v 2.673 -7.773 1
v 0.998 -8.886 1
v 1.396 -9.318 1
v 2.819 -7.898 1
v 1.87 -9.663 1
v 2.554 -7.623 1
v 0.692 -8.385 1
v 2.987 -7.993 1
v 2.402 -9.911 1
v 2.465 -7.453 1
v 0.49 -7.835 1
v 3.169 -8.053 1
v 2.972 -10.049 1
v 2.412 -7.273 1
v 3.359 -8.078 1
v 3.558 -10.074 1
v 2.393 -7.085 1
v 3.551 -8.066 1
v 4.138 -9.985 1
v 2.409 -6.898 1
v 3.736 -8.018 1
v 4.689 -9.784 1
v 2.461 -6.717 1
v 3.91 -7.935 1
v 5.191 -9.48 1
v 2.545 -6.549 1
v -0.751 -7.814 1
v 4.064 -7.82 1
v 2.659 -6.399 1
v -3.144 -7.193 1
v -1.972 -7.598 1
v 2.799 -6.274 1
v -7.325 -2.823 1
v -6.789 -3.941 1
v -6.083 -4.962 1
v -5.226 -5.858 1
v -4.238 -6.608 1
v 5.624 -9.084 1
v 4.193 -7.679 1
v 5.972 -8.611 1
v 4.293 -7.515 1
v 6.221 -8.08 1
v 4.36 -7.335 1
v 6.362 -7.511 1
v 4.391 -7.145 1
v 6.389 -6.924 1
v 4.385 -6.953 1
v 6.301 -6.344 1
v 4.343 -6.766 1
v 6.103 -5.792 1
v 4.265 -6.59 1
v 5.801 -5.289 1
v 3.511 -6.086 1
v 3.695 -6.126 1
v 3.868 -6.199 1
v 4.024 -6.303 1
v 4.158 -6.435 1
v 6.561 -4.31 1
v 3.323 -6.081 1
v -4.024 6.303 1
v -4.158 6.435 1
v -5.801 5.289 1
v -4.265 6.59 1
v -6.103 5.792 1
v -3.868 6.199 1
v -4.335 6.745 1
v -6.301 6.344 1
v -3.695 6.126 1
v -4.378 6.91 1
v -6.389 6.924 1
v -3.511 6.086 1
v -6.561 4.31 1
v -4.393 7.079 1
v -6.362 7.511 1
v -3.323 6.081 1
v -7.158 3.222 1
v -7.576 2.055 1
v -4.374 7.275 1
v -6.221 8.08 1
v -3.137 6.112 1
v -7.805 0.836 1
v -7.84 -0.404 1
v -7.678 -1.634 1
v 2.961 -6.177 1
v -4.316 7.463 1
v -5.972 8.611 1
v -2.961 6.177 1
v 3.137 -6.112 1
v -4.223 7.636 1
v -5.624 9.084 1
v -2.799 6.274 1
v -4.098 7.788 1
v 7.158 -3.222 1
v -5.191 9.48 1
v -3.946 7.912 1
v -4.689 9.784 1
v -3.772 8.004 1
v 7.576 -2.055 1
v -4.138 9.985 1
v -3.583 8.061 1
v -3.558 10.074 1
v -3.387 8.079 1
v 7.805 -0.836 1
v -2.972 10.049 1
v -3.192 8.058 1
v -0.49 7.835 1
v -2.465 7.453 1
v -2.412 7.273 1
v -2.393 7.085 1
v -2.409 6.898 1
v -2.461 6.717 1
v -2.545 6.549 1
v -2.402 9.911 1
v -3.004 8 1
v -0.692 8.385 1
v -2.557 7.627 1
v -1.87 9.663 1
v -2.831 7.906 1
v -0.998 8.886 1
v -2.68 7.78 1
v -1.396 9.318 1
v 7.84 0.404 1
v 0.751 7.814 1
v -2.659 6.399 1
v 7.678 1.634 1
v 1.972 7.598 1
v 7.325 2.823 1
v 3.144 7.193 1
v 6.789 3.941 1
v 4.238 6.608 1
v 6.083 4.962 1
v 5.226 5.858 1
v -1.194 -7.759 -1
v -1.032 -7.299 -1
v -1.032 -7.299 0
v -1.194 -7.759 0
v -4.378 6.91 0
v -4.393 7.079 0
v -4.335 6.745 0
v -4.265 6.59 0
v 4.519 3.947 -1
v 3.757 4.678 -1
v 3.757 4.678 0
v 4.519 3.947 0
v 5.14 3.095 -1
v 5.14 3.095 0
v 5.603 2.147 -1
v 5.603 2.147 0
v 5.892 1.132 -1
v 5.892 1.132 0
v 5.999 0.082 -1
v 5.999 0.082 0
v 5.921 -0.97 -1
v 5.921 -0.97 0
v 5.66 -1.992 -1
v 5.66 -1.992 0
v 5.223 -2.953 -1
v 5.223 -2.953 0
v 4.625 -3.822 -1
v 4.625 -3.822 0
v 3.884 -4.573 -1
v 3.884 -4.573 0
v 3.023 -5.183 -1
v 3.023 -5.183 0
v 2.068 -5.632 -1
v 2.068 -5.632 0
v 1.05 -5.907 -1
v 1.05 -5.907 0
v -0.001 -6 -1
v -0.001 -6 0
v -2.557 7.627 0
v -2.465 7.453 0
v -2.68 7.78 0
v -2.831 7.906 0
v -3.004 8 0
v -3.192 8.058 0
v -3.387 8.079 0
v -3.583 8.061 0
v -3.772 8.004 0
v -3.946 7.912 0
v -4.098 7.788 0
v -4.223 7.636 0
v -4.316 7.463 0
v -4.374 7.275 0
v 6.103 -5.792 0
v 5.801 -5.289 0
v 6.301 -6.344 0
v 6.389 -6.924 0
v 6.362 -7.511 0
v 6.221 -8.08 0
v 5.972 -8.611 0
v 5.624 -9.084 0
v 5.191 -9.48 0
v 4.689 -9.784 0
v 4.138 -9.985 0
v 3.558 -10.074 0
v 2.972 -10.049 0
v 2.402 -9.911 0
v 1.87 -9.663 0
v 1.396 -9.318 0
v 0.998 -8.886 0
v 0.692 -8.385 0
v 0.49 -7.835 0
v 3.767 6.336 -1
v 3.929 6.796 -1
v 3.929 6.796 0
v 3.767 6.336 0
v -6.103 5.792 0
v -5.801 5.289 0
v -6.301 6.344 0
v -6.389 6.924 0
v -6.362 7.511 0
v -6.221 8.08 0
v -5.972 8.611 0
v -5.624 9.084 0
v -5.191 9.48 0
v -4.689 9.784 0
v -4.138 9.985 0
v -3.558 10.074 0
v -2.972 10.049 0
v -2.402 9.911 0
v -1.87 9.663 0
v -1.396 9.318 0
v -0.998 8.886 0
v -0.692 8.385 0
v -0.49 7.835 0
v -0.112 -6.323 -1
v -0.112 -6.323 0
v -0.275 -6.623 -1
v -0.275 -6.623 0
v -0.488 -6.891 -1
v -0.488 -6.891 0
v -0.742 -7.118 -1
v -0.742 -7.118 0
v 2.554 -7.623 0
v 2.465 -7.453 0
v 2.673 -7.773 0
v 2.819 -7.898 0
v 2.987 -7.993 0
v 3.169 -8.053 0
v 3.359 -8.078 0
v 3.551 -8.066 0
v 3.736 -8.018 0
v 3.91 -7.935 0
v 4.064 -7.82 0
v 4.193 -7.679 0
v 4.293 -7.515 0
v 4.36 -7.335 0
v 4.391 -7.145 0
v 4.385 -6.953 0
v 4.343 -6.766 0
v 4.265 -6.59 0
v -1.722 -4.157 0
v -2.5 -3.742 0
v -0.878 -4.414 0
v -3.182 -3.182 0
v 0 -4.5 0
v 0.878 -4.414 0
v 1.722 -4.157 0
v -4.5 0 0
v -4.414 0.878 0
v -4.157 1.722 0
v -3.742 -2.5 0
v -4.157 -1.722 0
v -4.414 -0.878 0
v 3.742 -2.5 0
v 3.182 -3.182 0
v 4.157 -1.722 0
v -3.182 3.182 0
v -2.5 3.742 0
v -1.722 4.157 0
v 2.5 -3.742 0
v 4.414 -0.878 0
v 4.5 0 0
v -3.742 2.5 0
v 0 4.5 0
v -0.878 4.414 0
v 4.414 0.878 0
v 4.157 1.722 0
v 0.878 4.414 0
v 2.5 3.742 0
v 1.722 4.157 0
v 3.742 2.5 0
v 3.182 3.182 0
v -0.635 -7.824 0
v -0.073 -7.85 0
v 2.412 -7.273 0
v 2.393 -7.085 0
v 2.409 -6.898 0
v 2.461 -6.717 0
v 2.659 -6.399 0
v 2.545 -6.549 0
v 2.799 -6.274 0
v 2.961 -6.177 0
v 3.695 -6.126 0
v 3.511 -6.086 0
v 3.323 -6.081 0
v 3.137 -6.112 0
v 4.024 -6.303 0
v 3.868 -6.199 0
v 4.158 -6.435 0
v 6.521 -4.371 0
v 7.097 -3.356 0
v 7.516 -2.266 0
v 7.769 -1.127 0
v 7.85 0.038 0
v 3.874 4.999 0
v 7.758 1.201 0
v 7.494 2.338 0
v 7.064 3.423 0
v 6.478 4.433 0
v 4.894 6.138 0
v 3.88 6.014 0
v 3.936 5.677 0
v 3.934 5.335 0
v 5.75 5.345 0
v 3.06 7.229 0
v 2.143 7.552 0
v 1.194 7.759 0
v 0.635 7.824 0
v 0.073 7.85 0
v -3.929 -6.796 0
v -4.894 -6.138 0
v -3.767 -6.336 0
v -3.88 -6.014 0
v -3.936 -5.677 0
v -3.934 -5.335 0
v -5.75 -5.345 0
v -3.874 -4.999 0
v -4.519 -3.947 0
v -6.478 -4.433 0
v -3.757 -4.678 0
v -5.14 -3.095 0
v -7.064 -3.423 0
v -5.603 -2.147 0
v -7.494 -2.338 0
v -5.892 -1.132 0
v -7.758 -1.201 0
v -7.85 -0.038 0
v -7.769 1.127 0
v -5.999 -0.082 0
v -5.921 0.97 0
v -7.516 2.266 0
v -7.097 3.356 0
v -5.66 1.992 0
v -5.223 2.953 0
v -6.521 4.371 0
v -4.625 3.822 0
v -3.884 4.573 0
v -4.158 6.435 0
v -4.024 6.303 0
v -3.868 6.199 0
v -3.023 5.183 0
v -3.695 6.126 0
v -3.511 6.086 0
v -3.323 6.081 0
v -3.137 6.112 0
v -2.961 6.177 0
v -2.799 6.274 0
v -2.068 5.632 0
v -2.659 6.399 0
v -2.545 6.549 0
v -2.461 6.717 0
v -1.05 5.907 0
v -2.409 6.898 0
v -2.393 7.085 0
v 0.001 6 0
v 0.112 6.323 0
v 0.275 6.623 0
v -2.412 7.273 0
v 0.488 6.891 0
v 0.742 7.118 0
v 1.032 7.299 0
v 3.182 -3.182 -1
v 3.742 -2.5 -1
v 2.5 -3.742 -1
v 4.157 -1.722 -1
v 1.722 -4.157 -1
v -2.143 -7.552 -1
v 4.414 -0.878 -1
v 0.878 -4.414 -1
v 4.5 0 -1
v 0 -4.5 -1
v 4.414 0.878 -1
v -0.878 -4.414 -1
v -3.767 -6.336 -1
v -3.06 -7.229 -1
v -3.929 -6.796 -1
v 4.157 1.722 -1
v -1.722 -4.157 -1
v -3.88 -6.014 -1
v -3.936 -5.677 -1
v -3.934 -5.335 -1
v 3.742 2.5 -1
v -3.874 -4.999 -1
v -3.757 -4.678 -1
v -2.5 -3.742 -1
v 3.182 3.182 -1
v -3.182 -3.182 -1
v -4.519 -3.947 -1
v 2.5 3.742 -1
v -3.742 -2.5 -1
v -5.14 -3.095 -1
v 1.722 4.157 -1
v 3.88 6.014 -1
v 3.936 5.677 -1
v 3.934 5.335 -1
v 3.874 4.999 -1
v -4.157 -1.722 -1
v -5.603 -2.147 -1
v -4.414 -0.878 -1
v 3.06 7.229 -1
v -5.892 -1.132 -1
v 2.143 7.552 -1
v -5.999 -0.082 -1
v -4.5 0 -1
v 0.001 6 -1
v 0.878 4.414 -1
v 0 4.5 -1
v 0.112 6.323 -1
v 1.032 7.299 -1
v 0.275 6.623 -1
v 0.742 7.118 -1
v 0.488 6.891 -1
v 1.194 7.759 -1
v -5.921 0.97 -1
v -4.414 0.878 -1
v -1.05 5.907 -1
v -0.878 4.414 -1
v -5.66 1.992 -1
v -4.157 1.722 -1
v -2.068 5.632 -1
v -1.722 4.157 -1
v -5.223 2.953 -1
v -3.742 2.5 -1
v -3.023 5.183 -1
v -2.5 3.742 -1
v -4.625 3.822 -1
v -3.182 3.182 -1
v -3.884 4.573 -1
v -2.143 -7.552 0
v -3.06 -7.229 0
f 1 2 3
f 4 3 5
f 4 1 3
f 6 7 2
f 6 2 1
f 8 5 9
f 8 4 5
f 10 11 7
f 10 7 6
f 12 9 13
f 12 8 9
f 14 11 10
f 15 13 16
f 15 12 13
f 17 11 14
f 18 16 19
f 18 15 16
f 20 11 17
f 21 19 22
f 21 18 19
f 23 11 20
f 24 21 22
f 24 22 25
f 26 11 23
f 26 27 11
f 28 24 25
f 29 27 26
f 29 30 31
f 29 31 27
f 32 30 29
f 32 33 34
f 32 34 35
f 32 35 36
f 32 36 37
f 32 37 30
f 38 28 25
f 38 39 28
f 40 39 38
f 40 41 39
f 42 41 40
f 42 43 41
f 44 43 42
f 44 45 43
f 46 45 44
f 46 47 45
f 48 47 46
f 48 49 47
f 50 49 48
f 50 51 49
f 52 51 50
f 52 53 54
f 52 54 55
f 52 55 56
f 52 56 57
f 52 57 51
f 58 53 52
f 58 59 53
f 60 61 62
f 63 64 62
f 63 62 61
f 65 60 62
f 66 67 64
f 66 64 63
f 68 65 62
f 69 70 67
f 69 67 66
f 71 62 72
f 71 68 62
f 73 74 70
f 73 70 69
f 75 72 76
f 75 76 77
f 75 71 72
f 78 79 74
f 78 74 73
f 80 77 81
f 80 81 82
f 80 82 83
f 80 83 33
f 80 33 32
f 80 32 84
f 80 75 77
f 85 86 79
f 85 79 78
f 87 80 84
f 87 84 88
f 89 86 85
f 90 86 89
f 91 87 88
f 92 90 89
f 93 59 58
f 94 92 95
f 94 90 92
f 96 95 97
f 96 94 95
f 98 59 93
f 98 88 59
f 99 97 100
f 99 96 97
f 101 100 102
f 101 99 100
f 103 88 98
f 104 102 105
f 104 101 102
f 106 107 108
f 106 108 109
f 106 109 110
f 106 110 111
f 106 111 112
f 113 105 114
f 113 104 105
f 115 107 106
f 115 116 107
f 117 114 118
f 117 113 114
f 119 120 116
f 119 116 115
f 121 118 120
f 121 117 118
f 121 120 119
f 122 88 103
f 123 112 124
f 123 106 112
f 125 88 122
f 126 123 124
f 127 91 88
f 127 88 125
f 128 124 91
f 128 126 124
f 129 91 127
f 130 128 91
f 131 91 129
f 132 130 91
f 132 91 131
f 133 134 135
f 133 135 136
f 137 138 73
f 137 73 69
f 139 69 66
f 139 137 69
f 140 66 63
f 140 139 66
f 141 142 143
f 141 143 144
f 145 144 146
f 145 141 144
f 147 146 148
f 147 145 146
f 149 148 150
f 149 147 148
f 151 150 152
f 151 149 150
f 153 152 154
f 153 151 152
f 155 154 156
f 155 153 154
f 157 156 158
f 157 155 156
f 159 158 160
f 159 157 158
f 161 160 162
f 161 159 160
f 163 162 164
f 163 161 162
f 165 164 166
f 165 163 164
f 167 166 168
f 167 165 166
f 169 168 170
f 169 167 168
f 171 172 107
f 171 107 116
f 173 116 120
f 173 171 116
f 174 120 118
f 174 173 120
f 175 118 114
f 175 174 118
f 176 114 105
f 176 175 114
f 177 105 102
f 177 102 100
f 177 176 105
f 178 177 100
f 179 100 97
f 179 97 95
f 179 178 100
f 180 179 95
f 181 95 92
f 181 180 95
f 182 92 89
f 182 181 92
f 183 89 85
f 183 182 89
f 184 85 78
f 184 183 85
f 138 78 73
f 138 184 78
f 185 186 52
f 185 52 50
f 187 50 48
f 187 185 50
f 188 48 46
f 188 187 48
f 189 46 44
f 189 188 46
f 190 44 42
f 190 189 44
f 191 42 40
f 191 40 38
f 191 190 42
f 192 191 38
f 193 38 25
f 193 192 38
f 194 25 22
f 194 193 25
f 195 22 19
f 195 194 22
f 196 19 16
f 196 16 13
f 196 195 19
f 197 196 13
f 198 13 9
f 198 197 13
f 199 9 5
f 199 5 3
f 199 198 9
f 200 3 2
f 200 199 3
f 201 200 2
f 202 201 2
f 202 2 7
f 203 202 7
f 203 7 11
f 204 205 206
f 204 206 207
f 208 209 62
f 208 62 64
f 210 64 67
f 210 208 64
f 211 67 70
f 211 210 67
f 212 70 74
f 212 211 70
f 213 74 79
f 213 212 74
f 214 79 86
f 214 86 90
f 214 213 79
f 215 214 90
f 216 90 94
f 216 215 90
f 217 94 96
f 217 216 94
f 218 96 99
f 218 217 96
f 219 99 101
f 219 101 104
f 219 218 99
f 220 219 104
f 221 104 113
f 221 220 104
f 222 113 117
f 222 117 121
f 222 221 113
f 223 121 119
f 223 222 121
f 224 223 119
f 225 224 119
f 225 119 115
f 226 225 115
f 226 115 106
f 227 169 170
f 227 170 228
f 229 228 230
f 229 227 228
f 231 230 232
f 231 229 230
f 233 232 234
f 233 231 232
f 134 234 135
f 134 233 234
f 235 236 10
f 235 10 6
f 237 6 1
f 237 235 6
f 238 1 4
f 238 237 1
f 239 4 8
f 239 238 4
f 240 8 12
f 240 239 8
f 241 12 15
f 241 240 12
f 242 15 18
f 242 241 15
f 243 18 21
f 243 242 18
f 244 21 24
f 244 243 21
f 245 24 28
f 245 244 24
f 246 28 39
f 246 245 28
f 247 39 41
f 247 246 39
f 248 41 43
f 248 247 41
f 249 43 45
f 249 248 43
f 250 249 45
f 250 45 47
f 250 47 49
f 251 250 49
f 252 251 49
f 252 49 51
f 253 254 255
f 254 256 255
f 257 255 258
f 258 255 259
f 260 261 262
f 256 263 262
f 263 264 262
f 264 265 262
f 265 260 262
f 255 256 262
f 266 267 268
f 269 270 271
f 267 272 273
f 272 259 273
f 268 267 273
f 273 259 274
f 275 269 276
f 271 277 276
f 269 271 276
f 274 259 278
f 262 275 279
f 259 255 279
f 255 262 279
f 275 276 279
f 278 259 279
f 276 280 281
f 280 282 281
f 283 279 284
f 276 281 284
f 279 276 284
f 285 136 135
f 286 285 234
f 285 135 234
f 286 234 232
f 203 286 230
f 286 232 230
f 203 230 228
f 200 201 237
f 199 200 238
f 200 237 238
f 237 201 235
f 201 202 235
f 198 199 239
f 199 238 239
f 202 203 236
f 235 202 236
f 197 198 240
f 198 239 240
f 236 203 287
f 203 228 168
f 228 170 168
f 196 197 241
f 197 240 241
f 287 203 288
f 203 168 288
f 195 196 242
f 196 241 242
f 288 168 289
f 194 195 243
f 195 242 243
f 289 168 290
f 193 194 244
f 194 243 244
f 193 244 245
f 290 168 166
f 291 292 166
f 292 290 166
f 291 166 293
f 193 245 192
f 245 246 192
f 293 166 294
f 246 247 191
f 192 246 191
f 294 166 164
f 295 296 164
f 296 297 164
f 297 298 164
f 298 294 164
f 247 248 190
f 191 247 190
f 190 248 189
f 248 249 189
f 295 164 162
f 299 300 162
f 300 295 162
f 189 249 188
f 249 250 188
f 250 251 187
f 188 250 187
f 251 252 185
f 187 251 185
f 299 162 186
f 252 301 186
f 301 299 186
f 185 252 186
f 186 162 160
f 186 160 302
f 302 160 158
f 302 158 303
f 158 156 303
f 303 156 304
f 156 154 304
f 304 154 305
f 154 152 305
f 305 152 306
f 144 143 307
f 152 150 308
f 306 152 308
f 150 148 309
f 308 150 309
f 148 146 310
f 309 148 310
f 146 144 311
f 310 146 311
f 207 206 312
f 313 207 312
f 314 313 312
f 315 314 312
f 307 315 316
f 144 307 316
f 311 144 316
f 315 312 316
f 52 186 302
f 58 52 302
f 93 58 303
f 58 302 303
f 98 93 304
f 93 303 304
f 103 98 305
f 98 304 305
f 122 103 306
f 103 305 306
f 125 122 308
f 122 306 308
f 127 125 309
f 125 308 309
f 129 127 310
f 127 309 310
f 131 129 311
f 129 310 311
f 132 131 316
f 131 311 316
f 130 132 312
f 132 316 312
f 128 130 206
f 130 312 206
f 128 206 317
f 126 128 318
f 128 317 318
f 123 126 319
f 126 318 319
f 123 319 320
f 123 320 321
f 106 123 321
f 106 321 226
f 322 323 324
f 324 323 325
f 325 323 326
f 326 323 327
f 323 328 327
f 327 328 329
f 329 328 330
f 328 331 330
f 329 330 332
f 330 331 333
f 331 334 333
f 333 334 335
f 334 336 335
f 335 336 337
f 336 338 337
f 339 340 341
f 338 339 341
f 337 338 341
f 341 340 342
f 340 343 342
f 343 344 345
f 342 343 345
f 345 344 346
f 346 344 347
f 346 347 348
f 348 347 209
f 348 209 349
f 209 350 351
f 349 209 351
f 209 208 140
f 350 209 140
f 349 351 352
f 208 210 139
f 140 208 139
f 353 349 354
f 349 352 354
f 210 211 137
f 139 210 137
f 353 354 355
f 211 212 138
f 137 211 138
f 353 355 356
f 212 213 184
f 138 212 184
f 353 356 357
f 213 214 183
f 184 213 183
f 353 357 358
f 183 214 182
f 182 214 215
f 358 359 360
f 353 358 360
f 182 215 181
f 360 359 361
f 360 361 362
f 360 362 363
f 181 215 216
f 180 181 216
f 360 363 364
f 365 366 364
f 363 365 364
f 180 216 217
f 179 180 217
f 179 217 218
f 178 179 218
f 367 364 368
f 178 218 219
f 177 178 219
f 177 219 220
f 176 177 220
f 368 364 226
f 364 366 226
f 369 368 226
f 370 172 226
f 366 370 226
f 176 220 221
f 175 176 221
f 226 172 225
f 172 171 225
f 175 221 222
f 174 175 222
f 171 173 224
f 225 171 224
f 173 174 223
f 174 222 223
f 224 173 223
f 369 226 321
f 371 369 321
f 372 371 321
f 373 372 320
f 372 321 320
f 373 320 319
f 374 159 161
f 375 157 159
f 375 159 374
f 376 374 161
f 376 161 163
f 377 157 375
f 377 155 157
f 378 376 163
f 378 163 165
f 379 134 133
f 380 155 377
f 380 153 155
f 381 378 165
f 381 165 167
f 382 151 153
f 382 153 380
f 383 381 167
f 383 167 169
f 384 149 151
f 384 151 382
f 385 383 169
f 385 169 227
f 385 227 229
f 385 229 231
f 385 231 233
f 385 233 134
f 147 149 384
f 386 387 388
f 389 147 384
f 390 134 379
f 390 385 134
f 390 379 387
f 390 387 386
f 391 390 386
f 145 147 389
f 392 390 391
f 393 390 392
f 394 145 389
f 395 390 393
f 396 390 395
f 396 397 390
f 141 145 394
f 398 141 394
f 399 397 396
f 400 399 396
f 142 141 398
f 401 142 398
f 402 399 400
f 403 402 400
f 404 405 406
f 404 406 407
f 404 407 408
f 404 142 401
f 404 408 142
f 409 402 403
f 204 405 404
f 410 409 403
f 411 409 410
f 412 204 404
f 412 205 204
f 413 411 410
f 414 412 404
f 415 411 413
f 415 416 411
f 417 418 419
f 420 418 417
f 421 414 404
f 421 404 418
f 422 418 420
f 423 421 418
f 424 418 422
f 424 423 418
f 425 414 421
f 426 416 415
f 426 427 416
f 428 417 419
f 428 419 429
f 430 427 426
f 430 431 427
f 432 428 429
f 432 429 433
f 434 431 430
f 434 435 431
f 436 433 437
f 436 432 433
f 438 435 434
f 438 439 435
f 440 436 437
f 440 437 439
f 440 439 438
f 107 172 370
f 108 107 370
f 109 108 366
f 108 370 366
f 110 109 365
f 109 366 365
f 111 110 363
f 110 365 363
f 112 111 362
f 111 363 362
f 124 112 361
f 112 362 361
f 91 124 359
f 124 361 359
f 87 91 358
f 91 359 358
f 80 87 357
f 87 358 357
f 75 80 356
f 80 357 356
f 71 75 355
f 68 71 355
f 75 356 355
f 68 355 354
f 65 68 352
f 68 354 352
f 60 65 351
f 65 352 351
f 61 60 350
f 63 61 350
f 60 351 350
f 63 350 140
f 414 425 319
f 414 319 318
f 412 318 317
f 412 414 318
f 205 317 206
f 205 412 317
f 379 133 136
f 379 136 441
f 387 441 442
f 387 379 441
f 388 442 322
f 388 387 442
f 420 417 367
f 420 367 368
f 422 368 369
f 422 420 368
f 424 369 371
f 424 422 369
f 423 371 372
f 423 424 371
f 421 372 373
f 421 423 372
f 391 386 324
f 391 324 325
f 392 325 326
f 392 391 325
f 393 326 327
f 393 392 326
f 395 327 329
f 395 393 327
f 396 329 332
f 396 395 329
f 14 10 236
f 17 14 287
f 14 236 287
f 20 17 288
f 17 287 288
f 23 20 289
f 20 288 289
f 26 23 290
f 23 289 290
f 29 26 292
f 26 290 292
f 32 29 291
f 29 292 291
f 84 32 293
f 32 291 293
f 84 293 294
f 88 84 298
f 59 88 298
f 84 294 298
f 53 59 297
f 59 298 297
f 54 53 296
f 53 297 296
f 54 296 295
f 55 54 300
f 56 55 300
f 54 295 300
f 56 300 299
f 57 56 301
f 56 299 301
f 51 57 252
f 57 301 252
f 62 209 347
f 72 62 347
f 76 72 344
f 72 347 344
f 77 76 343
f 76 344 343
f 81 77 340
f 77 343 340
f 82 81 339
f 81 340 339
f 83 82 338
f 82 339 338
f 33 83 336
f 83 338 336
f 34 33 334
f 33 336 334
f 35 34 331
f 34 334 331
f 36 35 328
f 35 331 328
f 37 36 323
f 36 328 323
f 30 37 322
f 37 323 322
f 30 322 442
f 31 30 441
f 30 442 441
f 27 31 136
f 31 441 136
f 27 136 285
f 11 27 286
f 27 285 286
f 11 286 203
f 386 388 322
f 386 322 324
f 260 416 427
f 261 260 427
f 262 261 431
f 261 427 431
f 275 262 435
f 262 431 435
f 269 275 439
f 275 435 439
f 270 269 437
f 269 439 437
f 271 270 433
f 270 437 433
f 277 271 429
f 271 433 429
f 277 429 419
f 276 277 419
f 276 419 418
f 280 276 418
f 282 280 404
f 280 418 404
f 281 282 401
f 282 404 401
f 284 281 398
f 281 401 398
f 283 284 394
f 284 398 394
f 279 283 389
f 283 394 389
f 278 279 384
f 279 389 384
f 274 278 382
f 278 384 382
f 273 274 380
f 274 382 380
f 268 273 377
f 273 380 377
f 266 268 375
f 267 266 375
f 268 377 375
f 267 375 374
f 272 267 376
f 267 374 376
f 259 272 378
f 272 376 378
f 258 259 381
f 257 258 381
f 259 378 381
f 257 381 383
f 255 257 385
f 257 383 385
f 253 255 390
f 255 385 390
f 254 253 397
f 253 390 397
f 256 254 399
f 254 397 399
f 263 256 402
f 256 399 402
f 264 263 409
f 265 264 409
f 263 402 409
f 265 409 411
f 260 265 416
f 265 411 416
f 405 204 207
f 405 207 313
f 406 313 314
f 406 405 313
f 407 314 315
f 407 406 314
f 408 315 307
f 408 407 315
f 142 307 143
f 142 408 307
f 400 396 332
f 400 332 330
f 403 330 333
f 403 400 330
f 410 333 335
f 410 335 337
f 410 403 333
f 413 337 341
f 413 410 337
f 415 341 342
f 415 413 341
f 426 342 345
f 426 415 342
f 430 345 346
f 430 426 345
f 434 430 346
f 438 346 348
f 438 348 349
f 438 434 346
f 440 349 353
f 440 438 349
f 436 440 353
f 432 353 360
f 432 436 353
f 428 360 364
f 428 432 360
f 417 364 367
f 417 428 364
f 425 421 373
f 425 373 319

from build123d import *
from build123d.topology import SkipClean

# Parameters (mm, degrees)
SKETCH1_R           = 7.85
BOSS_EXTRUDE1_DEPTH = 1
BOSS_EXTRUDE2_START = 1
SKETCH3_R           = 6
SKETCH3_R_2         = 4.5
BOSS_EXTRUDE2_DEPTH = 1
BOSS_EXTRUDE3_DEPTH = 1
SKETCH2_3_R         = 1
CUT_EXTRUDE1_DEPTH  = 2
SKETCH2_4_R         = 1
CUT_EXTRUDE2_DEPTH  = 3


with BuildPart() as part:
    # Sketch1 → Boss-Extrude1 (new body)
    with BuildSketch(Plane.XY):
        Circle(SKETCH1_R)
    extrude(amount=BOSS_EXTRUDE1_DEPTH)

    # Sketch3 → Boss-Extrude2 (add)
    # profile 1 of 3: a face of its own
    with SkipClean():  # the faces are left unmerged after this step: merging them gives an invalid solid
        with BuildSketch(Plane(origin=(0, 0, 0), x_dir=(-1, 0, 0), z_dir=(0, 0, -1)).offset(BOSS_EXTRUDE2_START)):
            Circle(SKETCH3_R)
            Circle(SKETCH3_R_2, mode=Mode.SUBTRACT)
        # profile 2 of 3: a face of its own
        with BuildSketch(Plane(origin=(0, 0, 0), x_dir=(-1, 0, 0), z_dir=(0, 0, -1)).offset(BOSS_EXTRUDE2_START)):
            with BuildLine():
                ThreePointArc((3.757317387, -4.677880508), (1.992185075, -5.659611173), (0.001300165, -5.999999859))
                ThreePointArc((0.001300165, -5.999999859), (0.375700996, -6.761308528), (1.032012818, -7.298915878))
                Line((1.032012818, -7.298915878), (1.193852248, -7.758686539))
                ThreePointArc((1.193852248, -7.758686539), (2.606442139, -7.404657951), (3.929330982, -6.795797086))
                Line((3.929330982, -6.795797086), (3.767491551, -6.336026426))
                ThreePointArc((3.767491551, -6.336026426), (3.9423428, -5.505849389), (3.757317387, -4.677880508))
            make_face()
        # profile 3 of 3: a face of its own
        with BuildSketch(Plane(origin=(0, 0, 0), x_dir=(-1, 0, 0), z_dir=(0, 0, -1)).offset(BOSS_EXTRUDE2_START)):
            with BuildLine():
                Line((-3.929330982, 6.795797086), (-3.767491551, 6.336026426))
                ThreePointArc((-3.767491551, 6.336026426), (-3.9423428, 5.505849389), (-3.757317387, 4.677880508))
                ThreePointArc((-3.757317387, 4.677880508), (-1.992185075, 5.659611173), (-0.001300165, 5.999999859))
                ThreePointArc((-0.001300165, 5.999999859), (-0.375700996, 6.761308528), (-1.032012818, 7.298915878))
                Line((-1.032012818, 7.298915878), (-1.193852248, 7.758686539))
                ThreePointArc((-1.193852248, 7.758686539), (-2.606442139, 7.404657951), (-3.929330982, 6.795797086))
            make_face()
        extrude(amount=-BOSS_EXTRUDE2_DEPTH)

    # Sketch2 → Boss-Extrude3 (add)
    with BuildSketch(Plane(origin=(0, 0, 0), x_dir=(-1, 0, 0), z_dir=(0, 0, -1))):
        with BuildLine():
            ThreePointArc((-4.265263368, -6.590146311), (-5.074768612, -5.989092046), (-5.800557161, -5.289237811))
            ThreePointArc((-5.800557161, -5.289237811), (-4.68948187, -9.784235269), (-0.489616971, -7.834716027))
            ThreePointArc((-0.489616971, -7.834716027), (-1.489786667, -7.707336485), (-2.46537987, -7.452811691))
            ThreePointArc((-2.46537987, -7.452811691), (-3.825061249, -7.980689597), (-4.265263368, -6.590146311))
        make_face()
        with BuildLine():
            ThreePointArc((2.46537987, 7.452811691), (3.583283252, 8.060617089), (4.392850938, 7.078916761))
            ThreePointArc((4.392850938, 7.078916761), (4.360428436, 6.826342445), (4.265263368, 6.590146311))
            ThreePointArc((4.265263368, 6.590146311), (5.074768612, 5.989092046), (5.800557161, 5.289237811))
            ThreePointArc((5.800557161, 5.289237811), (4.68948187, 9.784235269), (0.489616971, 7.834716027))
            ThreePointArc((0.489616971, 7.834716027), (1.489786667, 7.707336485), (2.46537987, 7.452811691))
        make_face()
    extrude(amount=-BOSS_EXTRUDE3_DEPTH)

    # Sketch2<3> → Cut-Extrude1 (cut)
    with BuildSketch(Plane(origin=(0, 0, 0), x_dir=(-1, 0, 0), z_dir=(0, 0, -1))):
        with Locations((3.392850938, 7.078916761)):
            Circle(SKETCH2_3_R)
    extrude(amount=-CUT_EXTRUDE1_DEPTH, mode=Mode.SUBTRACT)

    # Sketch2<4> → Cut-Extrude2 (cut)
    with BuildSketch(Plane(origin=(0, 0, 0), x_dir=(-1, 0, 0), z_dir=(0, 0, -1))):
        with Locations((-3.392850938, -7.078916761)):
            Circle(SKETCH2_4_R)
    extrude(amount=-CUT_EXTRUDE2_DEPTH, mode=Mode.SUBTRACT)


solid = part.part
